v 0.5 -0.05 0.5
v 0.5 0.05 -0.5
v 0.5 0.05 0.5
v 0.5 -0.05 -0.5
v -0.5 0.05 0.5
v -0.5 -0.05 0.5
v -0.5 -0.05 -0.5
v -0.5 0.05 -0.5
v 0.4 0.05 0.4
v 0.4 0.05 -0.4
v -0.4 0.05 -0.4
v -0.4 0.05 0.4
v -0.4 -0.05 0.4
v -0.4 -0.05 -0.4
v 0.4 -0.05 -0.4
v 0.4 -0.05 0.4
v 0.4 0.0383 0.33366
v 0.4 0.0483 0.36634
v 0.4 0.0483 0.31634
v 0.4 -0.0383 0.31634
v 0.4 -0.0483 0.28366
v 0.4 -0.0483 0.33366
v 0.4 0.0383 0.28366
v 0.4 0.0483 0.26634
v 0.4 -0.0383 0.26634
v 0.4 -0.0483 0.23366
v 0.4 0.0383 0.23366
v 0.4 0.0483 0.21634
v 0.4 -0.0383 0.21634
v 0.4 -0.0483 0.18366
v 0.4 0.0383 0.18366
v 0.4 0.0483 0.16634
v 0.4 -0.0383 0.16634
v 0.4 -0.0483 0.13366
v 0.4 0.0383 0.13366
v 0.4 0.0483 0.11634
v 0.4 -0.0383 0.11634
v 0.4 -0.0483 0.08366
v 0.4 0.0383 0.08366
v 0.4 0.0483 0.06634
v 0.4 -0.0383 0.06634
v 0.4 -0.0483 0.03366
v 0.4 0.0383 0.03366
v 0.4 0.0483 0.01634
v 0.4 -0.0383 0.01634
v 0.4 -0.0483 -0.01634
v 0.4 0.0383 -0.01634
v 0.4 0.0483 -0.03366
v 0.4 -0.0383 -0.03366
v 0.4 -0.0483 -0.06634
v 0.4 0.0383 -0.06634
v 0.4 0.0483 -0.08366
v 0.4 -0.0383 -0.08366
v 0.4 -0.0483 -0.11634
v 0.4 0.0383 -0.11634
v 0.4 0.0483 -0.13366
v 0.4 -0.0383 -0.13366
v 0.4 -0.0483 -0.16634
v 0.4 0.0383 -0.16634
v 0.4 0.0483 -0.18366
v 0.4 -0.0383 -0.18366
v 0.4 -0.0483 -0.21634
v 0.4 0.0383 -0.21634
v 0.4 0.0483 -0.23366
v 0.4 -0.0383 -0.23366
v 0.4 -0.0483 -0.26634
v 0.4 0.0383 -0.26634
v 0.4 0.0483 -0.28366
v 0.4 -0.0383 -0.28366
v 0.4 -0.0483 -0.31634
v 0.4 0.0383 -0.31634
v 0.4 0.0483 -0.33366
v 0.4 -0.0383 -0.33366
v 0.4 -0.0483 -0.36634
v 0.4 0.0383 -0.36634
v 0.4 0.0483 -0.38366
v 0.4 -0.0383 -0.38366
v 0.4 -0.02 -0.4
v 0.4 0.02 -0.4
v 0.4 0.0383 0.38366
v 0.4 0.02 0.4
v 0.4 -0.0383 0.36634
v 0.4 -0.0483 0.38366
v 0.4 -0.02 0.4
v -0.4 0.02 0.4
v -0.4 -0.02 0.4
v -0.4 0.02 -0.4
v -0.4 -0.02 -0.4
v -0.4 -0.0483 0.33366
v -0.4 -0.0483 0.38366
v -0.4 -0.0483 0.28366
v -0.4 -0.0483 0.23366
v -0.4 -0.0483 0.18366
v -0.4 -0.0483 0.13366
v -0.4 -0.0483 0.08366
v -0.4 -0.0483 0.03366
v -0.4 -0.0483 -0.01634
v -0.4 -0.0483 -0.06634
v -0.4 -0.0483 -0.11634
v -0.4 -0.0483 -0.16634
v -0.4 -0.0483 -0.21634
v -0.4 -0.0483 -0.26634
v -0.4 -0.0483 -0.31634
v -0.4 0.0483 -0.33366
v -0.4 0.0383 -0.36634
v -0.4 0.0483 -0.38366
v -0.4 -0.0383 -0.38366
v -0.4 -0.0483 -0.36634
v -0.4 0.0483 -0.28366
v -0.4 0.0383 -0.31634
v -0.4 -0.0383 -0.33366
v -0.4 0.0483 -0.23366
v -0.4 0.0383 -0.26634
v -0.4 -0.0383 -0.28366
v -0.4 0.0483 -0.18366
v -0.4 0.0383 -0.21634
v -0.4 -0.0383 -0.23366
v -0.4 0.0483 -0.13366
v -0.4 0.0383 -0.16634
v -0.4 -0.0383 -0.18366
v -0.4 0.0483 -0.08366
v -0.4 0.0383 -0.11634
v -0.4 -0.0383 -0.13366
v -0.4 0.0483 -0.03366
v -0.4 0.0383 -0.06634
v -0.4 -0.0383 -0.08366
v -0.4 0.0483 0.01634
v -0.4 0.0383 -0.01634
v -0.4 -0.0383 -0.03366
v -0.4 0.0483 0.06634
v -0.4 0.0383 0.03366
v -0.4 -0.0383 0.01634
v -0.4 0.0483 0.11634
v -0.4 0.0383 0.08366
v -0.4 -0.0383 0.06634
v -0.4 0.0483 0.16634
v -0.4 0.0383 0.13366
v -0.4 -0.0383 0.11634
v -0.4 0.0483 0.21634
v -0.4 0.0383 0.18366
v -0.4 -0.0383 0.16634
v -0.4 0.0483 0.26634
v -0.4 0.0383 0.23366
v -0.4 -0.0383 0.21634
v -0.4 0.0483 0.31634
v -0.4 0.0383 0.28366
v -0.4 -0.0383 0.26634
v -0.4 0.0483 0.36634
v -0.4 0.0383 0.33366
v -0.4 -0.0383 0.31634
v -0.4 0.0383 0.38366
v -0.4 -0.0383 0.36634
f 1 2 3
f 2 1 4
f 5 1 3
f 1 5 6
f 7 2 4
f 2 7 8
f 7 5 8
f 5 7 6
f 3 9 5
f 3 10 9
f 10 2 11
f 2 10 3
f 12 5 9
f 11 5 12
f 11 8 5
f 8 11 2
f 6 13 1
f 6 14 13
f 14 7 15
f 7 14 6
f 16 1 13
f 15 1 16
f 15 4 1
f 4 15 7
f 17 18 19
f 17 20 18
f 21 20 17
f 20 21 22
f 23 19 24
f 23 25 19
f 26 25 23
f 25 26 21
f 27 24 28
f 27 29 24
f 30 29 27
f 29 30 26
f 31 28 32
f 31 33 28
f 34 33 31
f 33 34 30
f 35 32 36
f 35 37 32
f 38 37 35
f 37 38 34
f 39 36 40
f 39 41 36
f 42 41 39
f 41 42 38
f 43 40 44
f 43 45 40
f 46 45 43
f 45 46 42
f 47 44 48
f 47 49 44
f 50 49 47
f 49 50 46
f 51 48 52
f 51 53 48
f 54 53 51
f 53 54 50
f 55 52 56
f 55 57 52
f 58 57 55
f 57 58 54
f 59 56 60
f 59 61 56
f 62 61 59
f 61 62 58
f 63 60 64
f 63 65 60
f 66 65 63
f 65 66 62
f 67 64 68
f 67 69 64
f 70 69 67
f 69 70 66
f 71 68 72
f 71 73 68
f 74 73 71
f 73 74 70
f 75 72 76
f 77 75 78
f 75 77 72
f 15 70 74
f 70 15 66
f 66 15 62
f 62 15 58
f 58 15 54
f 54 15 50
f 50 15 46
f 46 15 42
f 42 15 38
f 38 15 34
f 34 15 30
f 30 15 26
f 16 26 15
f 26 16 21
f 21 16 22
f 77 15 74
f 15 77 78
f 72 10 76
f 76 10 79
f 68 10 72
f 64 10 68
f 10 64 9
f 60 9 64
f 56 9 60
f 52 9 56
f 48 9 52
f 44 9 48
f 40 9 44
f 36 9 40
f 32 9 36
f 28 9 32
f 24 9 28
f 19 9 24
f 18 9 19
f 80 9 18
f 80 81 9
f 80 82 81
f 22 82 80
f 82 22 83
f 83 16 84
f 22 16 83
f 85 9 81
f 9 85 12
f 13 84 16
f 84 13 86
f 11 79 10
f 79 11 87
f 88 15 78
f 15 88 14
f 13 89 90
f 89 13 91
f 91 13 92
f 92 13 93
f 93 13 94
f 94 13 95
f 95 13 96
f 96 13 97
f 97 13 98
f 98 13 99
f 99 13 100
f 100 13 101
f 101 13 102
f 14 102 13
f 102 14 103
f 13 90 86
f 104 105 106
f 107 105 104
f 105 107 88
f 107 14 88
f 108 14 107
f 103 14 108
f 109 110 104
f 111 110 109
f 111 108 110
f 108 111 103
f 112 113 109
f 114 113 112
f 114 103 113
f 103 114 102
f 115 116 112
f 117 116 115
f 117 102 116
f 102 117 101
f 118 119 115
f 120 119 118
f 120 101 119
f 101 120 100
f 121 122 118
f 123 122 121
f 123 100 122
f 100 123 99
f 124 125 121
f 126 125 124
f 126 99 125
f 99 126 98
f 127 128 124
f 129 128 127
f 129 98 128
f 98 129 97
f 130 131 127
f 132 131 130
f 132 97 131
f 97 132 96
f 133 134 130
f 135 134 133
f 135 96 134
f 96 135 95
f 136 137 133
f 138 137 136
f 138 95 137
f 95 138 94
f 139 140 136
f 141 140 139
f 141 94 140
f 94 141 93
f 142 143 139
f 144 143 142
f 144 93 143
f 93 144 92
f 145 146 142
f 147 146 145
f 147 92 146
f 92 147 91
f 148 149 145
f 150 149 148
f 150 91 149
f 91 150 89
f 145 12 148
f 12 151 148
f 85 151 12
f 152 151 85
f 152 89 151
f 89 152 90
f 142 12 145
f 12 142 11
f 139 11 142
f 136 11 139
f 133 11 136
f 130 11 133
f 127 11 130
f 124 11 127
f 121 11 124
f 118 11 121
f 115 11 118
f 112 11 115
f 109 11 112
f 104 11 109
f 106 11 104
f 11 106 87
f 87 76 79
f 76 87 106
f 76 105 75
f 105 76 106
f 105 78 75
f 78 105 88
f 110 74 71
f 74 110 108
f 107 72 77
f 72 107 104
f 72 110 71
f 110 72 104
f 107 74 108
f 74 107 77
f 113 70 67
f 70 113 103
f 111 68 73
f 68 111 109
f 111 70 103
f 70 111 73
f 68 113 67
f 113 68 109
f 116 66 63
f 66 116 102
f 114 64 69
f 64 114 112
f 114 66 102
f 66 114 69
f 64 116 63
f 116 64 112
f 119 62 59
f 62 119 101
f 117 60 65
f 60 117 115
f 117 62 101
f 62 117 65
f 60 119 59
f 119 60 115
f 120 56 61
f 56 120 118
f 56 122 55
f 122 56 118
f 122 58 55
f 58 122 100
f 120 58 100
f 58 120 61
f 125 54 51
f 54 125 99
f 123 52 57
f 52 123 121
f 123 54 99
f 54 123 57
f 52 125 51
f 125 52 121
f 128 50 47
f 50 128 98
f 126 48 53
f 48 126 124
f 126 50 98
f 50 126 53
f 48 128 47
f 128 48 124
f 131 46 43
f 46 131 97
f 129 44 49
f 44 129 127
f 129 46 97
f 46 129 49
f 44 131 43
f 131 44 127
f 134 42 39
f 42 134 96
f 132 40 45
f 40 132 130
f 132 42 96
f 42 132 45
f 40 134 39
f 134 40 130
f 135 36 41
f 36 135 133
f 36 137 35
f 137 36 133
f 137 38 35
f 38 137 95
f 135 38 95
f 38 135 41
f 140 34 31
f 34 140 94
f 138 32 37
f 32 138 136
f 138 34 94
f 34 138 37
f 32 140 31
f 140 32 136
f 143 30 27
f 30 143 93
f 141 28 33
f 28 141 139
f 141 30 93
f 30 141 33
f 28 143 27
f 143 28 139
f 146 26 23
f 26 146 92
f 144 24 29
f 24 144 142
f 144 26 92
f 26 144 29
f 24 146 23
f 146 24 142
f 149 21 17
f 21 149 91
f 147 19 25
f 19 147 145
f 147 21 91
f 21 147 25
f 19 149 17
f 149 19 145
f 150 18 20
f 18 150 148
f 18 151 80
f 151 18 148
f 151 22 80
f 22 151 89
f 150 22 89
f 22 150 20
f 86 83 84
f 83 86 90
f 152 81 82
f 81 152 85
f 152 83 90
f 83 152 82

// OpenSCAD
module Vent_Grid(){

    difference(){
        color("GRAY")
        cube([1,0.1,1], center = true);
        color("GRAY")
        cube([0.8,0.2,0.8], center = true);
    }

    for (i = [-0.4:0.05:0.4] ){
        color("DARKGRAY")
        
        translate([0,0,i])
        rotate([30,0,0])
        cube([0.9,0.1,0.02], center = true);
    }

}

Vent_Grid();


// Written by Nicolì Angelo (Gengio) 2024: 
// MIT License

//Permission is hereby granted, free of charge, to any person obtaining a copy of this software and associated documentation files (the "Software"), to deal in the Software without restriction, including without limitation the rights to use, copy, modify, merge, publish, distribute, sublicense, and/or sell copies of the Software, and to permit persons to whom the Software is furnished to do so, subject to the following conditions:

//The above copyright notice and this permission notice shall be included in all copies or substantial portions of the Software.

//THE SOFTWARE IS PROVIDED "AS IS", WITHOUT WARRANTY OF ANY KIND, EXPRESS OR IMPLIED, INCLUDING BUT NOT LIMITED TO THE WARRANTIES OF MERCHANTABILITY, FITNESS FOR A PARTICULAR PURPOSE AND NONINFRINGEMENT. IN NO EVENT SHALL THE AUTHORS OR COPYRIGHT HOLDERS BE LIABLE FOR ANY CLAIM, DAMAGES OR OTHER LIABILITY, WHETHER IN AN ACTION OF CONTRACT, TORT OR OTHERWISE, ARISING FROM, OUT OF OR IN CONNECTION WITH THE SOFTWARE OR THE USE OR OTHER DEALINGS IN THE SOFTWARE.
